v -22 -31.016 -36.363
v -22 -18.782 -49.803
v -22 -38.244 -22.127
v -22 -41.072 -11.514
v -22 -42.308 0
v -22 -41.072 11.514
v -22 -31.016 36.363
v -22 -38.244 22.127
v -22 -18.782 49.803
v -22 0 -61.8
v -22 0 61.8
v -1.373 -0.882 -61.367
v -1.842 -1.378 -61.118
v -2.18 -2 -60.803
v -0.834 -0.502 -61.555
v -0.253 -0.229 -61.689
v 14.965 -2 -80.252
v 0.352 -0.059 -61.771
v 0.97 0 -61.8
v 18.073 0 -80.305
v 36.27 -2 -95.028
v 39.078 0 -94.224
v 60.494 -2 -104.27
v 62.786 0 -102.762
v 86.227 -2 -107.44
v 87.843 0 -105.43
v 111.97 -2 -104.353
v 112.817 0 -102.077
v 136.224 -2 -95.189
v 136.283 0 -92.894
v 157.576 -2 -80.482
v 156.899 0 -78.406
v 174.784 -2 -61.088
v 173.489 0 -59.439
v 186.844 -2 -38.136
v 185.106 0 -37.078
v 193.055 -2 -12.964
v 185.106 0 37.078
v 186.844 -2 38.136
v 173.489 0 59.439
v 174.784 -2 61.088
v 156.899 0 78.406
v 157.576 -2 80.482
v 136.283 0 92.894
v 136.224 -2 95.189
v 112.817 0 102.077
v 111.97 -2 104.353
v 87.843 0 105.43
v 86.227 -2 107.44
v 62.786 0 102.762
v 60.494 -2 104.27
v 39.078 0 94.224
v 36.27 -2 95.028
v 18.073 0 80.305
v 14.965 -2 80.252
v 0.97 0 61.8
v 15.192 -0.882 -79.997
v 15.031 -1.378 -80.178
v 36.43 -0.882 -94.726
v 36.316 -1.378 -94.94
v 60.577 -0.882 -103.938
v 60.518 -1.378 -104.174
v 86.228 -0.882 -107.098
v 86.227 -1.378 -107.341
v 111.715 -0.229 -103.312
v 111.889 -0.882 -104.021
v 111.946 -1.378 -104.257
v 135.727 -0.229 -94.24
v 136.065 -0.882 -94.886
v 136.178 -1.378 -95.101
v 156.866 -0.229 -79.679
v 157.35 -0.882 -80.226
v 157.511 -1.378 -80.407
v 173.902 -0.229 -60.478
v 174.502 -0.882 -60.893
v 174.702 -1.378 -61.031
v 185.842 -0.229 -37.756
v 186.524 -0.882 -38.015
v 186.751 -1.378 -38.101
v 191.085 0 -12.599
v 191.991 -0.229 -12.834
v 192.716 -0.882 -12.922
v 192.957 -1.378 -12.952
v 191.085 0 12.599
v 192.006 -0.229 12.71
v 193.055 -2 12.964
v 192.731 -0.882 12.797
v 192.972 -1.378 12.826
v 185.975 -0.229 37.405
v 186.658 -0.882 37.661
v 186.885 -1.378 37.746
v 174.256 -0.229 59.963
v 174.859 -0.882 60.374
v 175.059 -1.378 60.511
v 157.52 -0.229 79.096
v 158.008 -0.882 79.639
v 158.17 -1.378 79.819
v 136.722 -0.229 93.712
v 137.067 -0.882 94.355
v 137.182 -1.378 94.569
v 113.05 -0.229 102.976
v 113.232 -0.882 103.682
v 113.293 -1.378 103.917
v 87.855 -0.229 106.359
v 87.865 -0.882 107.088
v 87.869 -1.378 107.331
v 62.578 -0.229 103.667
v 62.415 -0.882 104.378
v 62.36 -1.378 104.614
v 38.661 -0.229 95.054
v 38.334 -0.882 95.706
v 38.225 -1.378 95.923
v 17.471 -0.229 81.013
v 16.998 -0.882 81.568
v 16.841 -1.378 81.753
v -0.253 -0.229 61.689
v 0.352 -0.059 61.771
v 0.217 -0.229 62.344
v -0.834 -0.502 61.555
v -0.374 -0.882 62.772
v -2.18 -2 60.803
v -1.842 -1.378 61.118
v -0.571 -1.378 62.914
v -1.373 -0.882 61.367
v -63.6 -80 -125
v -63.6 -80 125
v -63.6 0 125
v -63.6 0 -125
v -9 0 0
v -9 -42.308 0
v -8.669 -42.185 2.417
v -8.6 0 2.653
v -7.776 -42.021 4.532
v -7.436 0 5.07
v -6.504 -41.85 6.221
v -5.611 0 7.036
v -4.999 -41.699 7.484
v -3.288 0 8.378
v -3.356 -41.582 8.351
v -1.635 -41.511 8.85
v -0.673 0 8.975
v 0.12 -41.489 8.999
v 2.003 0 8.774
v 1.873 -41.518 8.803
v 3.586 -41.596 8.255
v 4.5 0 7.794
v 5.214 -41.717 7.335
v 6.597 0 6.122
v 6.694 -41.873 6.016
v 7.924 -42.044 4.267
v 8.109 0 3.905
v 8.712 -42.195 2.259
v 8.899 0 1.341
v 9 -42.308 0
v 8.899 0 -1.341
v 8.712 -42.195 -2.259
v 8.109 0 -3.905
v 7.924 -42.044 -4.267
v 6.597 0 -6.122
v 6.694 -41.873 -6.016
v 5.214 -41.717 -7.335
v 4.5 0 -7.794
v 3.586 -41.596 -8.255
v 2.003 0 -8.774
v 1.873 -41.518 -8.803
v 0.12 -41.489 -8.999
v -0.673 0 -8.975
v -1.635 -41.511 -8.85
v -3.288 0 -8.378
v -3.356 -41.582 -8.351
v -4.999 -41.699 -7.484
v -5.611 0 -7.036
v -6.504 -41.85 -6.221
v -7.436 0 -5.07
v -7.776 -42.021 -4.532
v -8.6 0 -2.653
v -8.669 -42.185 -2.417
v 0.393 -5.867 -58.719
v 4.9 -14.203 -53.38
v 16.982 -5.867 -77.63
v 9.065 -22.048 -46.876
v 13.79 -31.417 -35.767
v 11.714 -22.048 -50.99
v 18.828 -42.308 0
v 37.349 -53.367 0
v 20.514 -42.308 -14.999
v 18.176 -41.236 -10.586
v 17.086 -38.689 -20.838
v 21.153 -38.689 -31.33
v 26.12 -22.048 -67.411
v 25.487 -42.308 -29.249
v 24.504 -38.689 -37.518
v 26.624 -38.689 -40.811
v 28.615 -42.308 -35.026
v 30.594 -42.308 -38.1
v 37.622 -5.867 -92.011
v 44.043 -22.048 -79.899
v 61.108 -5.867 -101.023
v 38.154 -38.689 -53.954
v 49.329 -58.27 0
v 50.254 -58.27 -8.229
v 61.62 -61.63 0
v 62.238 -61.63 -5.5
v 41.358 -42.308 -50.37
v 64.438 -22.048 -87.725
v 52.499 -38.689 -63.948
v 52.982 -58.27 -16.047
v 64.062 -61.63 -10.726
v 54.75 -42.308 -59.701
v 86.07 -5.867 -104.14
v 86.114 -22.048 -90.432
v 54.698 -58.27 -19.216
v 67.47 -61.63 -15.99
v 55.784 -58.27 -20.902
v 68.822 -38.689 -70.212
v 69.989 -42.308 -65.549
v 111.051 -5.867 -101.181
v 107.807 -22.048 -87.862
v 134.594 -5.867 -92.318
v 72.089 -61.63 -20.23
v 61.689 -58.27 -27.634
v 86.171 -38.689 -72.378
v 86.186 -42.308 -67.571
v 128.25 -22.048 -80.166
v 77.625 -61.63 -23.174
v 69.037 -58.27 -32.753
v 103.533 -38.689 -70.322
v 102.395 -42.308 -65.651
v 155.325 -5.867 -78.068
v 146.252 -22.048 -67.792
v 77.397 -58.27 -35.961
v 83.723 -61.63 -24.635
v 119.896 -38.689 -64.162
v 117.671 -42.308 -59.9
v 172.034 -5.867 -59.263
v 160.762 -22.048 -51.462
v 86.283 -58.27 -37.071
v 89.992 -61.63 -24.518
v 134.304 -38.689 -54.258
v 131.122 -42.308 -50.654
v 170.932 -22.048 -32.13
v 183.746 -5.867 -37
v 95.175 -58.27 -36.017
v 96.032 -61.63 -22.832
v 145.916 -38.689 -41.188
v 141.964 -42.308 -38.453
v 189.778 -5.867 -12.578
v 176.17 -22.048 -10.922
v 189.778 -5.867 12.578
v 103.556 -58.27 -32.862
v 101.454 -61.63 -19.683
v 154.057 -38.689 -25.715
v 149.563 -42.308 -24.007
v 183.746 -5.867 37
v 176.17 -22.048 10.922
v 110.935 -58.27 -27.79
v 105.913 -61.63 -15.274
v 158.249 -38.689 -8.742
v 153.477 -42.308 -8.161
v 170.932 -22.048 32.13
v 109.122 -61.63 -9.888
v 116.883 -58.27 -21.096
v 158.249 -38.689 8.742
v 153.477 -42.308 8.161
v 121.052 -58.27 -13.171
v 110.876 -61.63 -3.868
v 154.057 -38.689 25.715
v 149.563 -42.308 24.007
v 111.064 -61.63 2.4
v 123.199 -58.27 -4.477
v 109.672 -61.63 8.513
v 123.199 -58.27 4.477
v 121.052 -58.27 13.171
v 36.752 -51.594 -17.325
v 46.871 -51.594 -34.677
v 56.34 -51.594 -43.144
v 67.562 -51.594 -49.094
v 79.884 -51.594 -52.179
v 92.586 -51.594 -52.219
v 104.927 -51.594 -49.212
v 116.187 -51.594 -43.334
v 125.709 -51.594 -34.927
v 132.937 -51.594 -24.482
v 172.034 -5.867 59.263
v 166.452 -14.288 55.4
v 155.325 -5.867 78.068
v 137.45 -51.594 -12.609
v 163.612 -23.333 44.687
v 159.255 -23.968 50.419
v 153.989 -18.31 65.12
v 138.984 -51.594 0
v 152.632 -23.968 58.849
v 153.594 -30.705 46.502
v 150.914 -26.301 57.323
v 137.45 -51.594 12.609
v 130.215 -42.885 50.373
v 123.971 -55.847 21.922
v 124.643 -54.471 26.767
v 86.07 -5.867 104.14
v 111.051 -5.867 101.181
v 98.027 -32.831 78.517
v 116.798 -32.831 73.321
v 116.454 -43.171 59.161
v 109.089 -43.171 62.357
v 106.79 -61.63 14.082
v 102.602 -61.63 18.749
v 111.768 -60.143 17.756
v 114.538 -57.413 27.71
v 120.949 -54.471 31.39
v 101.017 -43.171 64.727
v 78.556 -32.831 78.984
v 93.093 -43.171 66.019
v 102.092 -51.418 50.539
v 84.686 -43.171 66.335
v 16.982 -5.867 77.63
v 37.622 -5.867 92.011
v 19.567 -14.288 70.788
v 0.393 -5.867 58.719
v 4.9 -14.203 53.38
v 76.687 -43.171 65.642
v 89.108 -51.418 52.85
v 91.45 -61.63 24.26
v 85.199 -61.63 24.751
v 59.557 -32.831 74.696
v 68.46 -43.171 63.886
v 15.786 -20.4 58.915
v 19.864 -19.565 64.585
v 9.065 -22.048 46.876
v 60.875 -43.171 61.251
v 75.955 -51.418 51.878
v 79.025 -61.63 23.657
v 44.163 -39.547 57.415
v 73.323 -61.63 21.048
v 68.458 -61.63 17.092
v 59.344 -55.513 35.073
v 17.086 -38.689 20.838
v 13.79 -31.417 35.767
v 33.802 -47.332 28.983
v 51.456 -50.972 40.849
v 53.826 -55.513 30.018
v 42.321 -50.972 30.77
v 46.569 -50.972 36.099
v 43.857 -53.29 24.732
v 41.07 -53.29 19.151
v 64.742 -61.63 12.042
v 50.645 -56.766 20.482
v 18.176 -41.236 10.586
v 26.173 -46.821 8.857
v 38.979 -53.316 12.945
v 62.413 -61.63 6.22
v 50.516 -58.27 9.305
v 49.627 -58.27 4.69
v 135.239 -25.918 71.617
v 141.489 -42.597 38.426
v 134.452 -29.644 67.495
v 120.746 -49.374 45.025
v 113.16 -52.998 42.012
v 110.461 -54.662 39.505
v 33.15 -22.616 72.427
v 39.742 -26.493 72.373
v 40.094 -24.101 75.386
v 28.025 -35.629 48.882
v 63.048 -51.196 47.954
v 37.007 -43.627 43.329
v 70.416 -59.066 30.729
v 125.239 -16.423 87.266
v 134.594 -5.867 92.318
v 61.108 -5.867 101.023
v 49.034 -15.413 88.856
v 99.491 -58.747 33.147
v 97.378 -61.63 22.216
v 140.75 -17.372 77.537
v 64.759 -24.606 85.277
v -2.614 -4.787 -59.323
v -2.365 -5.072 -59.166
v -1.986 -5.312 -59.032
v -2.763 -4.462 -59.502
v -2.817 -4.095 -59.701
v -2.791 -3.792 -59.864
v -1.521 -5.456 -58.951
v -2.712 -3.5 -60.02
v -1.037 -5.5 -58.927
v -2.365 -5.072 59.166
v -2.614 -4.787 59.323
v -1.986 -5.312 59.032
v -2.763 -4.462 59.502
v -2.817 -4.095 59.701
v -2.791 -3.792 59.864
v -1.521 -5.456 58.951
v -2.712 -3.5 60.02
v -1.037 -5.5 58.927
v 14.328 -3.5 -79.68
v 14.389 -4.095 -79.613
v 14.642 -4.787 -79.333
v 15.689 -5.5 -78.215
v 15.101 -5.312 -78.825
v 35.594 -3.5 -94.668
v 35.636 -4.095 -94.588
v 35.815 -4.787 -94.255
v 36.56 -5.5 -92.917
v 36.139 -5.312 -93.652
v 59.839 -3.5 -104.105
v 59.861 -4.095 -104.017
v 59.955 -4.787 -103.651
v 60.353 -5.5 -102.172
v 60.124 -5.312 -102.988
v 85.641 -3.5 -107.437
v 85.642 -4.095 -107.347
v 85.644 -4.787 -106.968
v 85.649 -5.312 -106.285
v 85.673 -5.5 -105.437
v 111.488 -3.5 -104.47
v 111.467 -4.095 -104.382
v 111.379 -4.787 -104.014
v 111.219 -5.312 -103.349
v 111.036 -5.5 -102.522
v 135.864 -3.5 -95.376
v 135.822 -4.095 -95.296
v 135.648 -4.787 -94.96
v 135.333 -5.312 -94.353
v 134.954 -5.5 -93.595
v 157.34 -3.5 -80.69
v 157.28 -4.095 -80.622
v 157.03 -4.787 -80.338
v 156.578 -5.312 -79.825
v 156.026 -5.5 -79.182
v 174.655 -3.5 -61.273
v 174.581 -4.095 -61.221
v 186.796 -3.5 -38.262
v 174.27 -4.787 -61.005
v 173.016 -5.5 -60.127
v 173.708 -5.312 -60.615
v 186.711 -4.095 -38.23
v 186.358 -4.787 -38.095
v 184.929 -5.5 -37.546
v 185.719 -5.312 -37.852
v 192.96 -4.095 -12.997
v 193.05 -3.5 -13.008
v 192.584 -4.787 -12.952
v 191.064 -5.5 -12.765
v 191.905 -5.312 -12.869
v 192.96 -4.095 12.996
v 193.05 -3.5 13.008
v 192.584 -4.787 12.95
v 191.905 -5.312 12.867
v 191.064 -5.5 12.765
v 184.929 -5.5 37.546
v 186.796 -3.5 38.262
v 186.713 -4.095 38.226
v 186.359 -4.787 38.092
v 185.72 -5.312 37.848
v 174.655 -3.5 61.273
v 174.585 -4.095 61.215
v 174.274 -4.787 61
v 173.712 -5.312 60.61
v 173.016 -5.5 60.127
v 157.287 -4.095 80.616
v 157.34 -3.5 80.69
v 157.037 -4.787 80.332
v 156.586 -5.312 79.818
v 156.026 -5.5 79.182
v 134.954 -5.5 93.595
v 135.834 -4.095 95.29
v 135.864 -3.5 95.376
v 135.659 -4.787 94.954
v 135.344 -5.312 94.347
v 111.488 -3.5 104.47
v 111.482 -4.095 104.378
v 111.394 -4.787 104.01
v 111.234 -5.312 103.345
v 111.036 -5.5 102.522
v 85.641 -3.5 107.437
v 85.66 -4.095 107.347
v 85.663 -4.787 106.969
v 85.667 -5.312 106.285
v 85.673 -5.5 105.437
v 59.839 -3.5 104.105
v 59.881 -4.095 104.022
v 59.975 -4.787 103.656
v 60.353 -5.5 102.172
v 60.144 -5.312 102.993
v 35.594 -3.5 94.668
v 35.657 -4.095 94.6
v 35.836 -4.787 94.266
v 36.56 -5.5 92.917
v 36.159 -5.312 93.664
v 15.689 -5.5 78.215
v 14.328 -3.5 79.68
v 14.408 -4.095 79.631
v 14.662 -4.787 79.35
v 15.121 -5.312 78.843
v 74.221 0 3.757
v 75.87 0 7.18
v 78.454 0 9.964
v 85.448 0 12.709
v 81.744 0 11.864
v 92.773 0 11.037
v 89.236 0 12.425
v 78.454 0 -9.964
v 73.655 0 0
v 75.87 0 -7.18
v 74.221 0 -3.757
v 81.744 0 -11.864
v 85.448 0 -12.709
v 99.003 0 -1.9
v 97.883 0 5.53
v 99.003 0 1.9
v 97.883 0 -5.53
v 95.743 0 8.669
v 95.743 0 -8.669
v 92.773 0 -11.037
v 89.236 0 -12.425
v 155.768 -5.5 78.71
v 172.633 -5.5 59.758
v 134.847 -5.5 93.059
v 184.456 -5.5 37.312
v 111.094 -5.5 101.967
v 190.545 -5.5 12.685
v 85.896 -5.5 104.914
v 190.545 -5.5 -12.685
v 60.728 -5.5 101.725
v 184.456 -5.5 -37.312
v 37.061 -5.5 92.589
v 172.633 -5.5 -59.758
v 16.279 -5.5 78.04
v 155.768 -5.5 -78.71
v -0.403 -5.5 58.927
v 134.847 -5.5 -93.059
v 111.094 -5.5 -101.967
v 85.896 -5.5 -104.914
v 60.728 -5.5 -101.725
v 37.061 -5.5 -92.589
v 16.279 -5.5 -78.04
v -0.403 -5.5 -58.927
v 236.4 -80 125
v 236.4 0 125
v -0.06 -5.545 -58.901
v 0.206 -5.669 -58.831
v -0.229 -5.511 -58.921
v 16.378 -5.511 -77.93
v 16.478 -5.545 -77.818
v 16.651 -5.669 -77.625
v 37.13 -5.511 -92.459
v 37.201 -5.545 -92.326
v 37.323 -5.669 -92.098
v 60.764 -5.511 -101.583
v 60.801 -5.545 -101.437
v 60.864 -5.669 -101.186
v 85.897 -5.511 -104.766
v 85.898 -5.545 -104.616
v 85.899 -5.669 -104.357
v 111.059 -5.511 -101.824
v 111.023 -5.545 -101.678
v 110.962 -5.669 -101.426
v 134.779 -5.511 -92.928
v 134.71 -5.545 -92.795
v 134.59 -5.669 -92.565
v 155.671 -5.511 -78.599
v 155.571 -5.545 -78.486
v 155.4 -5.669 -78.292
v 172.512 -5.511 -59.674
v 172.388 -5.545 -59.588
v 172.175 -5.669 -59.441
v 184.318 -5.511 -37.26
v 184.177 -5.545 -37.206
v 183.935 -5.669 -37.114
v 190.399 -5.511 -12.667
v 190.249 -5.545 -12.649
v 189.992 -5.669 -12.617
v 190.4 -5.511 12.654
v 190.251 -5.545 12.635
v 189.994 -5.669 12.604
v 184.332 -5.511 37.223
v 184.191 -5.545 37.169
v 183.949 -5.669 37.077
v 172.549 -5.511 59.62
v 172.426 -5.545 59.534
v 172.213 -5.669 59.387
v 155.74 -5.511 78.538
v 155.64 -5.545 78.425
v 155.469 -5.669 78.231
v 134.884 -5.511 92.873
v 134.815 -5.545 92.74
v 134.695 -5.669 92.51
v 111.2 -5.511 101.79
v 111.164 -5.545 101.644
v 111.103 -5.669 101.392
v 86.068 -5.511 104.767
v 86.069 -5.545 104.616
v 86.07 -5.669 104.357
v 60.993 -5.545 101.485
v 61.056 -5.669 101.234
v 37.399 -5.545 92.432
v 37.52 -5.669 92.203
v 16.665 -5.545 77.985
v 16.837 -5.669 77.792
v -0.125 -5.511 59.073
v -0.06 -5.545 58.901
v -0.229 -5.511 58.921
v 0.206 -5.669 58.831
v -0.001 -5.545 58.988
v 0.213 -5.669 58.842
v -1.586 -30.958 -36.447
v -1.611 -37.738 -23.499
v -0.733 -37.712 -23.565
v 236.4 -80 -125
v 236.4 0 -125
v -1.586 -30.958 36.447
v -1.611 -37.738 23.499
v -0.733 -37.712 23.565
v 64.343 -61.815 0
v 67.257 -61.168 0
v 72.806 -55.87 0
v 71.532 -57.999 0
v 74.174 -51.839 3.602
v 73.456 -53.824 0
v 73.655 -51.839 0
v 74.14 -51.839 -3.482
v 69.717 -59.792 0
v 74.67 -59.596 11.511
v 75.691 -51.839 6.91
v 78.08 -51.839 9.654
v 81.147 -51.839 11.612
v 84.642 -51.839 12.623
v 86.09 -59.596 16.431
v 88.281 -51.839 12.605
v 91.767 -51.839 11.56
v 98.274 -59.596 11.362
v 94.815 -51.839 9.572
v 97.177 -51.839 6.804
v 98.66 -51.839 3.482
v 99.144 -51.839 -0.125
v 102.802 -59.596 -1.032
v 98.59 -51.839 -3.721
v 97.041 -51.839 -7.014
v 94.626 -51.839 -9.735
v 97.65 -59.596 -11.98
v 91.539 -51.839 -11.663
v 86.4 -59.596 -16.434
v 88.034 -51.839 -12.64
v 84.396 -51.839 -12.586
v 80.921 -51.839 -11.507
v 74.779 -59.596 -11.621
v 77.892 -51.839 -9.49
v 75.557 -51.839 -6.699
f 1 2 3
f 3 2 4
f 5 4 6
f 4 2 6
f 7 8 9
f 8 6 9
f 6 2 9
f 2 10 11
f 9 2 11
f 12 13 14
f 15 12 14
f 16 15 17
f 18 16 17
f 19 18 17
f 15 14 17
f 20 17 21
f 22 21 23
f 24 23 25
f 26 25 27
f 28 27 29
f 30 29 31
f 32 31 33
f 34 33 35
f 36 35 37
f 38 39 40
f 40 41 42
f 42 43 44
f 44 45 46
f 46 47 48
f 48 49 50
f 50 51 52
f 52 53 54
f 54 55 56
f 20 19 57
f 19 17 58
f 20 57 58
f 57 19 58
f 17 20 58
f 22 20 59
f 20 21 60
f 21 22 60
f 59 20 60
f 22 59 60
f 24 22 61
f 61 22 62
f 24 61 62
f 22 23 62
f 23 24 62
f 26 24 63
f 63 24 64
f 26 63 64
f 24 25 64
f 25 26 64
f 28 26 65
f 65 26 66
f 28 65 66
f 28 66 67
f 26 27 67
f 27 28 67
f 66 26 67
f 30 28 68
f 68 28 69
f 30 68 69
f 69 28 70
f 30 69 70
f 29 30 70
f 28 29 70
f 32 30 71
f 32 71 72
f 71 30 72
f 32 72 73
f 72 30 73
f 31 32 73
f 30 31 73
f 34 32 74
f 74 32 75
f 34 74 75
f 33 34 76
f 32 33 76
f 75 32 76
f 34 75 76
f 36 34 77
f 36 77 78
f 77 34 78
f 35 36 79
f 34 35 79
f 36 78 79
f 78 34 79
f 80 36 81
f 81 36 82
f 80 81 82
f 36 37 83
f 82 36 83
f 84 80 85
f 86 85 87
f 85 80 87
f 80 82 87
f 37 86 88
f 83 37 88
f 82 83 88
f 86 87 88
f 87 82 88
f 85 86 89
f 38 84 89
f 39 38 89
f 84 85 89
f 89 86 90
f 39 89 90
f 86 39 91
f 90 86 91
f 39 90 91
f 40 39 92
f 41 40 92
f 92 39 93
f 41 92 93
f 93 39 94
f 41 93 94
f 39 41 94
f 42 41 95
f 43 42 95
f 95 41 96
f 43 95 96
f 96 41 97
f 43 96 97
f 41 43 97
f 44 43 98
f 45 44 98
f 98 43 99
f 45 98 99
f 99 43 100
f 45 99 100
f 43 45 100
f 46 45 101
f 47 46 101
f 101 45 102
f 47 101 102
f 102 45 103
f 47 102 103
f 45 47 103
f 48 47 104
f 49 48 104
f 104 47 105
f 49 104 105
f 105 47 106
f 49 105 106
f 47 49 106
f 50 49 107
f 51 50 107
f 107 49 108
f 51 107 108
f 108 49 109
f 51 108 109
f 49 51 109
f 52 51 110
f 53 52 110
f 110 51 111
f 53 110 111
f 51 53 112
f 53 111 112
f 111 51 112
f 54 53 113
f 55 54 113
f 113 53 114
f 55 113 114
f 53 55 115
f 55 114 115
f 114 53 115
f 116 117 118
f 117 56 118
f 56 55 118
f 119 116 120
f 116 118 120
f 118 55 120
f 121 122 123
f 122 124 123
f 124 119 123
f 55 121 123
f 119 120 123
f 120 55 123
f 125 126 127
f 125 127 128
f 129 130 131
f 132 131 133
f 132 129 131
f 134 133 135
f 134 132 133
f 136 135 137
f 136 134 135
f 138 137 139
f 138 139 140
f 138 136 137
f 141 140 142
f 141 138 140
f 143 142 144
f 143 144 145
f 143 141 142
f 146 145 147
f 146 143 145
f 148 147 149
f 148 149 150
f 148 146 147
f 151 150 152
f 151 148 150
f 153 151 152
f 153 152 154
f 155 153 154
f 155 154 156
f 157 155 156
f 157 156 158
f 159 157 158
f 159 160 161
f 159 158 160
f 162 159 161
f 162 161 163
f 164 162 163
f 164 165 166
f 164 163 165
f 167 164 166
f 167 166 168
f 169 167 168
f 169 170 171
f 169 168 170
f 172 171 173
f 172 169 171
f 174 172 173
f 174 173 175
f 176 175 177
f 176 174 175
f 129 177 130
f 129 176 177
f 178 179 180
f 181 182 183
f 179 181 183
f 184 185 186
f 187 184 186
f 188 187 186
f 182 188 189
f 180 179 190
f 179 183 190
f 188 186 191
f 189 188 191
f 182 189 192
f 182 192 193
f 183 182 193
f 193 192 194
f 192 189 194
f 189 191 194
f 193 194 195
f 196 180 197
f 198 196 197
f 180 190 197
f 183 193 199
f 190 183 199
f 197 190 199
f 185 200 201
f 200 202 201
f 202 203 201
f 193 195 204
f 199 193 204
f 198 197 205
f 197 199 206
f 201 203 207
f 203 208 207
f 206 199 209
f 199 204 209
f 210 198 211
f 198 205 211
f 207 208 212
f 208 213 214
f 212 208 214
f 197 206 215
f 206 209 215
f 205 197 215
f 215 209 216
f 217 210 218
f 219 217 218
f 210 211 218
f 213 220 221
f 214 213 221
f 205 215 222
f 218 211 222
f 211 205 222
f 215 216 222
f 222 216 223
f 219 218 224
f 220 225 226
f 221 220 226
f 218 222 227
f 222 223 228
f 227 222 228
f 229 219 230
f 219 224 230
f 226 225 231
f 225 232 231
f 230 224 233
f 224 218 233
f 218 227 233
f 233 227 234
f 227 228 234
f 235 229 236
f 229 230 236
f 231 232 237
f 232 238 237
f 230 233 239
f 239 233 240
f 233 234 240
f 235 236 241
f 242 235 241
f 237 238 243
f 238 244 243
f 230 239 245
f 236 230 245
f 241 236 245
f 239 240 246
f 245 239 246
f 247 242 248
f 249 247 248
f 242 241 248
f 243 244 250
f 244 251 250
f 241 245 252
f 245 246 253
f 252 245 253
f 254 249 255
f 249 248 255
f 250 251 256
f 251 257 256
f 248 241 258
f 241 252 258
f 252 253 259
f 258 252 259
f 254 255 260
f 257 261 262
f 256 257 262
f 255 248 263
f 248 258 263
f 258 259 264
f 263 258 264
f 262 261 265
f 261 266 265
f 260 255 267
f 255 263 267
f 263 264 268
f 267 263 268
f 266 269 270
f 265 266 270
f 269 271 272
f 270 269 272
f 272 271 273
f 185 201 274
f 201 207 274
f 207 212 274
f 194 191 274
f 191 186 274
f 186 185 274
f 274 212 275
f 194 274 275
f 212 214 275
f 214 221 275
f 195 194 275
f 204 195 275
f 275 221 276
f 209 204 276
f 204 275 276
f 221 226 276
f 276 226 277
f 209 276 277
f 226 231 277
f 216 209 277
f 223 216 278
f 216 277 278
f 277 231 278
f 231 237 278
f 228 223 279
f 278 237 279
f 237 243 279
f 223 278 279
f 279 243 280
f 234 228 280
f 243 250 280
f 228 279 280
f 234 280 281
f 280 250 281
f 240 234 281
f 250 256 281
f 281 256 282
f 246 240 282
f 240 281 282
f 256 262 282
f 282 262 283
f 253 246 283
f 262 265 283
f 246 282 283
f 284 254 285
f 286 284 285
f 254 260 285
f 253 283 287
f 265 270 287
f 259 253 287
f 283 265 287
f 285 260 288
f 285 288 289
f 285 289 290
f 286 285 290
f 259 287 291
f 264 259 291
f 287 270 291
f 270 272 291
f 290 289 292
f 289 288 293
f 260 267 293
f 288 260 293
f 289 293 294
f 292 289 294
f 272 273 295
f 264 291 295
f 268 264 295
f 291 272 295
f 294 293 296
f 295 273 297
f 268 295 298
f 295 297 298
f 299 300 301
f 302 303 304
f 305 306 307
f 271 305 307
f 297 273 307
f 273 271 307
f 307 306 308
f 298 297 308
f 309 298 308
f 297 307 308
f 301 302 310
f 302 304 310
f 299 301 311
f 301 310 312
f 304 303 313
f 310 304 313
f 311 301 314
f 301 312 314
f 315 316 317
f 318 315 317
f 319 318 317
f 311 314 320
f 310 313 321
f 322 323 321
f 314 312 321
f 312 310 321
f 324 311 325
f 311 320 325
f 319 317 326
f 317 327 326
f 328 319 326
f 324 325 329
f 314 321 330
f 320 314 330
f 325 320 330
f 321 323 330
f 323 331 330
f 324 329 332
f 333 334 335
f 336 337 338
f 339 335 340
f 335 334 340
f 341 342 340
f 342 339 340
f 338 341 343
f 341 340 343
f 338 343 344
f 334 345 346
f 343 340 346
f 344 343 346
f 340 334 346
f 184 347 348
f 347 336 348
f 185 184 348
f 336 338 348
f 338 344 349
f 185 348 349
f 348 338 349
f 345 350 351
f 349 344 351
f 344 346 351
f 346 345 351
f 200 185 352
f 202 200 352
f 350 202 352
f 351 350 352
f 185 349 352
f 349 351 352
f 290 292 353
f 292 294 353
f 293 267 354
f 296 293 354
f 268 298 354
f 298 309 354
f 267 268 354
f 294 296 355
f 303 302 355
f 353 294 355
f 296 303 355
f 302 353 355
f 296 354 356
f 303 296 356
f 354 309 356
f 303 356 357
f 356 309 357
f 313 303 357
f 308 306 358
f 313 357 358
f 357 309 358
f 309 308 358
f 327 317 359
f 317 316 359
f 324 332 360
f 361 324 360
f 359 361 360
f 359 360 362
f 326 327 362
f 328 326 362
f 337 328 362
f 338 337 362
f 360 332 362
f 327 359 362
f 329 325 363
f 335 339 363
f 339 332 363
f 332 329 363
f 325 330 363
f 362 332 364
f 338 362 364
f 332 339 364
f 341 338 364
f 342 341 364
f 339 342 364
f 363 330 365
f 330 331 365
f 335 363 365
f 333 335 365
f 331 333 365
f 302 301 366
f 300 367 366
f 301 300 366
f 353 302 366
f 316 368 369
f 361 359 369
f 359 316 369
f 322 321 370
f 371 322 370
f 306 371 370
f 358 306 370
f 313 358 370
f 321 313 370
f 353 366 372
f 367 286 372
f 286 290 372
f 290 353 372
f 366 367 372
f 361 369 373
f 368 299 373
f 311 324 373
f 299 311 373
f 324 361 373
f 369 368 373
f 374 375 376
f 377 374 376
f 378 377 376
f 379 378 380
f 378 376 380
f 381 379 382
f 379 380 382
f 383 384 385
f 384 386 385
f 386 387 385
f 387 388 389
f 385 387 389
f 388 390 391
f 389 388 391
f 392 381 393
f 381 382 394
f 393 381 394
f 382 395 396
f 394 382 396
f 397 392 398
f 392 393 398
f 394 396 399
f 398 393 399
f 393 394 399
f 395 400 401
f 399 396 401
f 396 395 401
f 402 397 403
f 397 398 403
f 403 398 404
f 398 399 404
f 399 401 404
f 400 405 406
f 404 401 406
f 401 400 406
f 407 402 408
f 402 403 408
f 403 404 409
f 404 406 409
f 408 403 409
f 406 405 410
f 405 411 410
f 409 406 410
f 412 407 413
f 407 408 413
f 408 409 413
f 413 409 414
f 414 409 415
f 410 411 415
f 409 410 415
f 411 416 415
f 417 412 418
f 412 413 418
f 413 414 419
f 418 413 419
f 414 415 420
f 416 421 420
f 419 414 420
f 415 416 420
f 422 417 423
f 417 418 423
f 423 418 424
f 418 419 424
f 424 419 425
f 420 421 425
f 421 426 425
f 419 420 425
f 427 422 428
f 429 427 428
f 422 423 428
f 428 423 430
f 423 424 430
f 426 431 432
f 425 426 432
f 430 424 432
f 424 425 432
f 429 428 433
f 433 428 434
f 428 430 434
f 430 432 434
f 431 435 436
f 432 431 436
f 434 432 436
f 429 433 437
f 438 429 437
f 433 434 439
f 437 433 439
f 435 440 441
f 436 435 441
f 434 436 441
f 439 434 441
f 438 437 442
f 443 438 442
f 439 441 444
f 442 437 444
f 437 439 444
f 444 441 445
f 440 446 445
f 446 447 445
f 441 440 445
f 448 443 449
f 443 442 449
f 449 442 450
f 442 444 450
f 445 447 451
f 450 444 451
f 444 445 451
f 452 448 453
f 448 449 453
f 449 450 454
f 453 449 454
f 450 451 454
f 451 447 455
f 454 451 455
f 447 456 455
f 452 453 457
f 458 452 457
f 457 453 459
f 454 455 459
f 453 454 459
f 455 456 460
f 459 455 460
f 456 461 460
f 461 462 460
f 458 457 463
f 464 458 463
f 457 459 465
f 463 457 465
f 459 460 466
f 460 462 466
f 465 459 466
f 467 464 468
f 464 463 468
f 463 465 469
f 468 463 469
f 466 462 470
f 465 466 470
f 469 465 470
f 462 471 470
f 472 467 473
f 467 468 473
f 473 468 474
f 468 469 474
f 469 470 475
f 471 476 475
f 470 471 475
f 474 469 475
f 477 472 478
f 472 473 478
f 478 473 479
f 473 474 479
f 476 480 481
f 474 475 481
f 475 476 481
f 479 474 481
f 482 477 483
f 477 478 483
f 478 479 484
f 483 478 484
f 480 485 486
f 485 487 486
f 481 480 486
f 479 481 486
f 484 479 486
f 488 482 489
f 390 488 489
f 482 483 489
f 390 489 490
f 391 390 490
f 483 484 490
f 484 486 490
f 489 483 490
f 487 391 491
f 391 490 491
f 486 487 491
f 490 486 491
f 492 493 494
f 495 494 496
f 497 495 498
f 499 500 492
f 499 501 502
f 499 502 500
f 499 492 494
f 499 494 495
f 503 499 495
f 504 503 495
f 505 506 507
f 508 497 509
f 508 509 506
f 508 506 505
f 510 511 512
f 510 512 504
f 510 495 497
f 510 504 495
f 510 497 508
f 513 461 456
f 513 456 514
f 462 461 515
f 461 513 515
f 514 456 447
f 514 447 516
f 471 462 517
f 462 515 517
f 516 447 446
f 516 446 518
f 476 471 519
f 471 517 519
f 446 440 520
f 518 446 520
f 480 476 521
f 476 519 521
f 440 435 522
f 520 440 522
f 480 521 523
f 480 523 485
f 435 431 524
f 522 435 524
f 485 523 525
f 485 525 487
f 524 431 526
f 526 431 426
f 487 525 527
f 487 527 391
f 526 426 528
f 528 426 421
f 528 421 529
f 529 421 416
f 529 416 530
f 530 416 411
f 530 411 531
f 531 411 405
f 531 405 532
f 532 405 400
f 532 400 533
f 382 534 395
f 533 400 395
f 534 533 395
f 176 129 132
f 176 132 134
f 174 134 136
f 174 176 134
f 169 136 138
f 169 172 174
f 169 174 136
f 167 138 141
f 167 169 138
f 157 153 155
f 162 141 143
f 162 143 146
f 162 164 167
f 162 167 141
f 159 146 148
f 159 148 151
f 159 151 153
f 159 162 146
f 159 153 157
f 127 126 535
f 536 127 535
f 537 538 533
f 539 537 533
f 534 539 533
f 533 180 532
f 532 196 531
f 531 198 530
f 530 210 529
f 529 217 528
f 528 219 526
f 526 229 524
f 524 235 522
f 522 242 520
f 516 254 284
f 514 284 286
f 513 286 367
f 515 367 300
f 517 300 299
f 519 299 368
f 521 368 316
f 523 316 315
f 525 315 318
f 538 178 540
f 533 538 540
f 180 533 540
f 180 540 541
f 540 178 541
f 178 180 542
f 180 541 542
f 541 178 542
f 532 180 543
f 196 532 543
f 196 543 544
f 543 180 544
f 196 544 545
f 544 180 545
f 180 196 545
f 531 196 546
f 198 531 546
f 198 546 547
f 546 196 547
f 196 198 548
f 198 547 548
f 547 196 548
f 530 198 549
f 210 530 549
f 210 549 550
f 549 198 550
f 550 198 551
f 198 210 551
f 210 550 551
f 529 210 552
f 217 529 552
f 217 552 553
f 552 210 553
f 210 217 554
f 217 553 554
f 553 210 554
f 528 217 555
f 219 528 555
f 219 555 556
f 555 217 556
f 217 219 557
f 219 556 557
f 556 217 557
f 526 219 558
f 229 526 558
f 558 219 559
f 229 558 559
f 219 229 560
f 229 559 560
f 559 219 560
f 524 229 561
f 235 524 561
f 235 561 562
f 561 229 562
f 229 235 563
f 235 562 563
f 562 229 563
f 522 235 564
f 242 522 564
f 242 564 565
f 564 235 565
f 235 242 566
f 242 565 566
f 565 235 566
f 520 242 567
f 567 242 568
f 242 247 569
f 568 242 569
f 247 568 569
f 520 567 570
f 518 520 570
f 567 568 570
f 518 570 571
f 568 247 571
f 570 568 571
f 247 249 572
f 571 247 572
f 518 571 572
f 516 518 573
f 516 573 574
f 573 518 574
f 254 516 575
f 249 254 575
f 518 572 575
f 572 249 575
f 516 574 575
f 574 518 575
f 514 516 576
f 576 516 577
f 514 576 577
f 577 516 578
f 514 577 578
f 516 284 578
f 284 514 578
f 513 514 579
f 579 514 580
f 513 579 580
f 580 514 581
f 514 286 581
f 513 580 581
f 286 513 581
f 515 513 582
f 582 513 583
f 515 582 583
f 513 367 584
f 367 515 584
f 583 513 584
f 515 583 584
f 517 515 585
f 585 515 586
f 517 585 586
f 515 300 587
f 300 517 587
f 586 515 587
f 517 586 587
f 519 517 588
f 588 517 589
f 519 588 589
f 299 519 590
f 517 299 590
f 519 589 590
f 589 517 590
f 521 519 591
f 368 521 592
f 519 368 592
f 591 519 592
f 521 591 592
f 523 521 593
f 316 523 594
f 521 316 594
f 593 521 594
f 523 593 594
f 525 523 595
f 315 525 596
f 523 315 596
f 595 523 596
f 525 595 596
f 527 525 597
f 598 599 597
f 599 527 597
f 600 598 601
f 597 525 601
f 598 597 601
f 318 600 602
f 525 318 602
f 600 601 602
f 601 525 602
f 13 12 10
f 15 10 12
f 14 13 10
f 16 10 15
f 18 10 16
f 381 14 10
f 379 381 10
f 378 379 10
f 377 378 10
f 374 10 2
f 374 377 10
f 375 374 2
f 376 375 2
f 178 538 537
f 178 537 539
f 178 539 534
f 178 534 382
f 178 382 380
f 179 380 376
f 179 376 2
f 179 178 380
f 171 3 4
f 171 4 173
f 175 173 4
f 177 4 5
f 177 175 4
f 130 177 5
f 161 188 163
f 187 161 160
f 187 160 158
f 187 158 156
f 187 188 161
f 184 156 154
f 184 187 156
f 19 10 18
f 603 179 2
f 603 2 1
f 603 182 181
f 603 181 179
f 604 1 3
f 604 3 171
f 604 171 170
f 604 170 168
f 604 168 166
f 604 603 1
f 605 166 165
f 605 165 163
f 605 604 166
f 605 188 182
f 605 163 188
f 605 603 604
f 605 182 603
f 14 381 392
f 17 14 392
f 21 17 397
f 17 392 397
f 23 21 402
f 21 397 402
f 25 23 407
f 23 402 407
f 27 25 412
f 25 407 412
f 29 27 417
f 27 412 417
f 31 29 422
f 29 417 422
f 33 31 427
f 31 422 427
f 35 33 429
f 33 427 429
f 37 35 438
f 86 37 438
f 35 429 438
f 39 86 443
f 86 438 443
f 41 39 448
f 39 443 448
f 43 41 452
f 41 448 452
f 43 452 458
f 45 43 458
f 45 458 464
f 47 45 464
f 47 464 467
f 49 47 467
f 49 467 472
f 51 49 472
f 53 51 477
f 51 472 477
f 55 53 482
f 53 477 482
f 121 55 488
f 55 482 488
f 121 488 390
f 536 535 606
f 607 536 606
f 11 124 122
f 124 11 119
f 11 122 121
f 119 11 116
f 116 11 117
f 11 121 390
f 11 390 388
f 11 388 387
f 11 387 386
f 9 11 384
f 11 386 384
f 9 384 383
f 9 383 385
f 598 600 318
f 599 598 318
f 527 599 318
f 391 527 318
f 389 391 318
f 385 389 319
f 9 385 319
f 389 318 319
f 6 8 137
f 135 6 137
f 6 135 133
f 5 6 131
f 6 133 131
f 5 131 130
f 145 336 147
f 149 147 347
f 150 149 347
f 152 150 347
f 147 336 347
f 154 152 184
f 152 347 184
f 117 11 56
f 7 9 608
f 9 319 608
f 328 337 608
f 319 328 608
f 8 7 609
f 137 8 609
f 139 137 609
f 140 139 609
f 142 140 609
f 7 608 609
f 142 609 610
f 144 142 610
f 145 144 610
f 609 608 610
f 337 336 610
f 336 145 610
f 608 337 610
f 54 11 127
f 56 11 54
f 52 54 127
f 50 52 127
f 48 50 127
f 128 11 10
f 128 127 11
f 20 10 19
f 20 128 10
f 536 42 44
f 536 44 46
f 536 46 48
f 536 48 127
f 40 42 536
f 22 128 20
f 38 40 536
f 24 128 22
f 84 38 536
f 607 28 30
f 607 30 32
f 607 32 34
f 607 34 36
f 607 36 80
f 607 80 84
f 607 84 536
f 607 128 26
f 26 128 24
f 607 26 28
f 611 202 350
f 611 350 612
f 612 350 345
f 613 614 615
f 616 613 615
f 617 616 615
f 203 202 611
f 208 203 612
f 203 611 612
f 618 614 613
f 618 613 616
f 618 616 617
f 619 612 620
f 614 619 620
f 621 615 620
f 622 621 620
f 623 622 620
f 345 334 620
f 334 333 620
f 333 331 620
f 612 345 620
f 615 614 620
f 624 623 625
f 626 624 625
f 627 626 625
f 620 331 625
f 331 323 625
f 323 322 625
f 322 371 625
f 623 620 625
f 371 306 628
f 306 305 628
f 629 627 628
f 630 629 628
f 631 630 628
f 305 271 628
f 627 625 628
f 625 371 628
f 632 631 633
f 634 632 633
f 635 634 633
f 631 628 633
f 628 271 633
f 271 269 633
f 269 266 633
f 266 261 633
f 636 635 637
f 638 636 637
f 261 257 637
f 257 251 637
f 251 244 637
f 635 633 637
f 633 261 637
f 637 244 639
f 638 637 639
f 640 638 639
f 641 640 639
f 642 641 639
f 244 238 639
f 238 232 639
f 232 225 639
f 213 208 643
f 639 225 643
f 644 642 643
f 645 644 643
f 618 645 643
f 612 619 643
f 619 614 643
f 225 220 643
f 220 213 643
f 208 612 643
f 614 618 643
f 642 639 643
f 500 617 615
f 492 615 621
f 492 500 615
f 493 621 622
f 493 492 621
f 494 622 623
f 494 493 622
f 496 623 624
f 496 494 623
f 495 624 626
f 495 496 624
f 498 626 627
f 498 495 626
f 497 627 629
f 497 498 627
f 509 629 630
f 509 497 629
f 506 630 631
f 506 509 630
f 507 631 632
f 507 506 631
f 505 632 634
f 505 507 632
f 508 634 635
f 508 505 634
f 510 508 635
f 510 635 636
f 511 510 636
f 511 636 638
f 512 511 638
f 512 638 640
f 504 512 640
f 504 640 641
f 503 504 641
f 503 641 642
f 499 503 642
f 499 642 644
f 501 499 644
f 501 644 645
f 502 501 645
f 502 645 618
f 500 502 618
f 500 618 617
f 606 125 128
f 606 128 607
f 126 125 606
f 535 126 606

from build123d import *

# Parameters (mm, degrees)
BOSS_EXTRUDE1_DEPTH      = 42
SKETCH4_R                = 12.745
CUT_EXTRUDE2_DEPTH       = 231.623535649
SKETCH7_R                = 9
CUT_EXTRUDE4_DEPTH       = 231.513348808
BOSS_EXTRUDE2_DEPTH      = 20
BOSS_EXTRUDE2_DEPTH_BACK = 60
BOSS_EXTRUDE2_START      = -20
SKETCH8_W                = 300
SKETCH8_H                = 250
FILLET1_R                = 10


with BuildPart() as part:
    # Sketch1 → Revolve1 (revolve)
    with BuildSketch(Plane.XY):
        with BuildLine():
            Line((0, -2.75), (0, 0))
            Line((0, 0), (86.4, 0))
            Line((86.4, 0), (86.4, -51.52))
            add(Edge.make_bspline(
                [(0, -2.75), (26.471278047, -40.623393059), (56.78647802, -59.047909877), (86.4, -51.52)],
                knots=[0, 0, 0, 0, 0.721198988, 0.721198988, 0.721198988, 0.721198988], degree=3))
        make_face()
        with BuildLine():
            ThreePointArc((-18.514834727, -5.5), (-18.086269469, -5.596489171), (-17.740408022, -5.867336362))
            add(Edge.make_bspline(
                [(-17.740408022, -5.867336362), (28.13170189, -65.595276468), (86.4, -63.74)],
                knots=[0, 0, 0, 0.824732104, 0.824732104, 0.824732104], degree=2))
            Line((86.4, -63.74), (86.4, -51.52))
            add(Edge.make_bspline(
                [(0, -2.75), (26.471278047, -40.623393059), (56.78647802, -59.047909877), (86.4, -51.52)],
                knots=[0, 0, 0, 0, 0.721198988, 0.721198988, 0.721198988, 0.721198988], degree=3))
            Line((0, -2.75), (0, 0))
            Line((0, 0), (-19.04, 0))
            ThreePointArc((-19.04, 0), (-20.454213562, -0.585786438), (-21.04, -2))
            Line((-21.04, -2), (-21.04, -3.5))
            ThreePointArc((-21.04, -3.5), (-20.454213562, -4.914213562), (-19.04, -5.5))
            Line((-19.04, -5.5), (-18.514834727, -5.5))
        make_face()
    revolve(axis=Axis((86.4, 0, 0), (0, -1, 0)))

    # Sketch3 → Boss-Extrude1 (add)
    with BuildSketch(Plane(origin=(20, 0, 0), x_dir=(0, 0, -1), z_dir=(1, 0, 0))):
        with BuildLine():
            Line((-61.8, 0), (61.8, 0))
            add(Edge.make_bspline(
                [(61.8, 0), (41.99440737, -40.763024165), (0, -42.307560131)],
                knots=[0, 0, 0, 1, 1, 1], degree=2))
            add(Edge.make_bspline(
                [(-61.8, 0), (-41.99440737, -40.763024165), (0, -42.307560131)],
                knots=[0, 0, 0, 1, 1, 1], degree=2))
        make_face()
    extrude(amount=-BOSS_EXTRUDE1_DEPTH)

    # Sketch4 → Cut-Extrude2 (cut, through all)
    with BuildSketch(Plane(origin=(0, 0, 0), x_dir=(1, 0, 0), z_dir=(0, 1, 0))):
        with Locations(Location((86.4, 0, 0), (0, 0, 180))):
            Circle(SKETCH4_R)
    extrude(amount=-CUT_EXTRUDE2_DEPTH, mode=Mode.SUBTRACT)

    # Sketch7 → Cut-Extrude4 (cut, through all)
    with BuildSketch(Plane(origin=(0, 0, 0), x_dir=(1, 0, 0), z_dir=(0, 1, 0))):
        with Locations(Location((0, 0, 0), (0, 0, 180))):
            Circle(SKETCH7_R)
    extrude(amount=-CUT_EXTRUDE4_DEPTH, mode=Mode.SUBTRACT)


with BuildPart() as body_2:
    # Sketch8 → Boss-Extrude2 (new, two sides: drawn at the far end of the back side and taken through both)
    with BuildSketch(Plane(origin=(0, 0, 0), x_dir=(1, 0, 0), z_dir=(0, 1, 0)).offset(BOSS_EXTRUDE2_START - BOSS_EXTRUDE2_DEPTH_BACK)):
        with Locations((86.4, 0)):
            Rectangle(SKETCH8_W, SKETCH8_H)
    extrude(amount=BOSS_EXTRUDE2_DEPTH + BOSS_EXTRUDE2_DEPTH_BACK)

    # Combine1: cut part
    add(part.part, mode=Mode.SUBTRACT)

    # Fillet1
    fillet1_edges = [body_2.edges().sort_by_distance(p)[0] for p in [
        (99.145000004, -63.396409238, 2e-09),
    ]]
    fillet(fillet1_edges, radius=FILLET1_R)


solid = body_2.part
